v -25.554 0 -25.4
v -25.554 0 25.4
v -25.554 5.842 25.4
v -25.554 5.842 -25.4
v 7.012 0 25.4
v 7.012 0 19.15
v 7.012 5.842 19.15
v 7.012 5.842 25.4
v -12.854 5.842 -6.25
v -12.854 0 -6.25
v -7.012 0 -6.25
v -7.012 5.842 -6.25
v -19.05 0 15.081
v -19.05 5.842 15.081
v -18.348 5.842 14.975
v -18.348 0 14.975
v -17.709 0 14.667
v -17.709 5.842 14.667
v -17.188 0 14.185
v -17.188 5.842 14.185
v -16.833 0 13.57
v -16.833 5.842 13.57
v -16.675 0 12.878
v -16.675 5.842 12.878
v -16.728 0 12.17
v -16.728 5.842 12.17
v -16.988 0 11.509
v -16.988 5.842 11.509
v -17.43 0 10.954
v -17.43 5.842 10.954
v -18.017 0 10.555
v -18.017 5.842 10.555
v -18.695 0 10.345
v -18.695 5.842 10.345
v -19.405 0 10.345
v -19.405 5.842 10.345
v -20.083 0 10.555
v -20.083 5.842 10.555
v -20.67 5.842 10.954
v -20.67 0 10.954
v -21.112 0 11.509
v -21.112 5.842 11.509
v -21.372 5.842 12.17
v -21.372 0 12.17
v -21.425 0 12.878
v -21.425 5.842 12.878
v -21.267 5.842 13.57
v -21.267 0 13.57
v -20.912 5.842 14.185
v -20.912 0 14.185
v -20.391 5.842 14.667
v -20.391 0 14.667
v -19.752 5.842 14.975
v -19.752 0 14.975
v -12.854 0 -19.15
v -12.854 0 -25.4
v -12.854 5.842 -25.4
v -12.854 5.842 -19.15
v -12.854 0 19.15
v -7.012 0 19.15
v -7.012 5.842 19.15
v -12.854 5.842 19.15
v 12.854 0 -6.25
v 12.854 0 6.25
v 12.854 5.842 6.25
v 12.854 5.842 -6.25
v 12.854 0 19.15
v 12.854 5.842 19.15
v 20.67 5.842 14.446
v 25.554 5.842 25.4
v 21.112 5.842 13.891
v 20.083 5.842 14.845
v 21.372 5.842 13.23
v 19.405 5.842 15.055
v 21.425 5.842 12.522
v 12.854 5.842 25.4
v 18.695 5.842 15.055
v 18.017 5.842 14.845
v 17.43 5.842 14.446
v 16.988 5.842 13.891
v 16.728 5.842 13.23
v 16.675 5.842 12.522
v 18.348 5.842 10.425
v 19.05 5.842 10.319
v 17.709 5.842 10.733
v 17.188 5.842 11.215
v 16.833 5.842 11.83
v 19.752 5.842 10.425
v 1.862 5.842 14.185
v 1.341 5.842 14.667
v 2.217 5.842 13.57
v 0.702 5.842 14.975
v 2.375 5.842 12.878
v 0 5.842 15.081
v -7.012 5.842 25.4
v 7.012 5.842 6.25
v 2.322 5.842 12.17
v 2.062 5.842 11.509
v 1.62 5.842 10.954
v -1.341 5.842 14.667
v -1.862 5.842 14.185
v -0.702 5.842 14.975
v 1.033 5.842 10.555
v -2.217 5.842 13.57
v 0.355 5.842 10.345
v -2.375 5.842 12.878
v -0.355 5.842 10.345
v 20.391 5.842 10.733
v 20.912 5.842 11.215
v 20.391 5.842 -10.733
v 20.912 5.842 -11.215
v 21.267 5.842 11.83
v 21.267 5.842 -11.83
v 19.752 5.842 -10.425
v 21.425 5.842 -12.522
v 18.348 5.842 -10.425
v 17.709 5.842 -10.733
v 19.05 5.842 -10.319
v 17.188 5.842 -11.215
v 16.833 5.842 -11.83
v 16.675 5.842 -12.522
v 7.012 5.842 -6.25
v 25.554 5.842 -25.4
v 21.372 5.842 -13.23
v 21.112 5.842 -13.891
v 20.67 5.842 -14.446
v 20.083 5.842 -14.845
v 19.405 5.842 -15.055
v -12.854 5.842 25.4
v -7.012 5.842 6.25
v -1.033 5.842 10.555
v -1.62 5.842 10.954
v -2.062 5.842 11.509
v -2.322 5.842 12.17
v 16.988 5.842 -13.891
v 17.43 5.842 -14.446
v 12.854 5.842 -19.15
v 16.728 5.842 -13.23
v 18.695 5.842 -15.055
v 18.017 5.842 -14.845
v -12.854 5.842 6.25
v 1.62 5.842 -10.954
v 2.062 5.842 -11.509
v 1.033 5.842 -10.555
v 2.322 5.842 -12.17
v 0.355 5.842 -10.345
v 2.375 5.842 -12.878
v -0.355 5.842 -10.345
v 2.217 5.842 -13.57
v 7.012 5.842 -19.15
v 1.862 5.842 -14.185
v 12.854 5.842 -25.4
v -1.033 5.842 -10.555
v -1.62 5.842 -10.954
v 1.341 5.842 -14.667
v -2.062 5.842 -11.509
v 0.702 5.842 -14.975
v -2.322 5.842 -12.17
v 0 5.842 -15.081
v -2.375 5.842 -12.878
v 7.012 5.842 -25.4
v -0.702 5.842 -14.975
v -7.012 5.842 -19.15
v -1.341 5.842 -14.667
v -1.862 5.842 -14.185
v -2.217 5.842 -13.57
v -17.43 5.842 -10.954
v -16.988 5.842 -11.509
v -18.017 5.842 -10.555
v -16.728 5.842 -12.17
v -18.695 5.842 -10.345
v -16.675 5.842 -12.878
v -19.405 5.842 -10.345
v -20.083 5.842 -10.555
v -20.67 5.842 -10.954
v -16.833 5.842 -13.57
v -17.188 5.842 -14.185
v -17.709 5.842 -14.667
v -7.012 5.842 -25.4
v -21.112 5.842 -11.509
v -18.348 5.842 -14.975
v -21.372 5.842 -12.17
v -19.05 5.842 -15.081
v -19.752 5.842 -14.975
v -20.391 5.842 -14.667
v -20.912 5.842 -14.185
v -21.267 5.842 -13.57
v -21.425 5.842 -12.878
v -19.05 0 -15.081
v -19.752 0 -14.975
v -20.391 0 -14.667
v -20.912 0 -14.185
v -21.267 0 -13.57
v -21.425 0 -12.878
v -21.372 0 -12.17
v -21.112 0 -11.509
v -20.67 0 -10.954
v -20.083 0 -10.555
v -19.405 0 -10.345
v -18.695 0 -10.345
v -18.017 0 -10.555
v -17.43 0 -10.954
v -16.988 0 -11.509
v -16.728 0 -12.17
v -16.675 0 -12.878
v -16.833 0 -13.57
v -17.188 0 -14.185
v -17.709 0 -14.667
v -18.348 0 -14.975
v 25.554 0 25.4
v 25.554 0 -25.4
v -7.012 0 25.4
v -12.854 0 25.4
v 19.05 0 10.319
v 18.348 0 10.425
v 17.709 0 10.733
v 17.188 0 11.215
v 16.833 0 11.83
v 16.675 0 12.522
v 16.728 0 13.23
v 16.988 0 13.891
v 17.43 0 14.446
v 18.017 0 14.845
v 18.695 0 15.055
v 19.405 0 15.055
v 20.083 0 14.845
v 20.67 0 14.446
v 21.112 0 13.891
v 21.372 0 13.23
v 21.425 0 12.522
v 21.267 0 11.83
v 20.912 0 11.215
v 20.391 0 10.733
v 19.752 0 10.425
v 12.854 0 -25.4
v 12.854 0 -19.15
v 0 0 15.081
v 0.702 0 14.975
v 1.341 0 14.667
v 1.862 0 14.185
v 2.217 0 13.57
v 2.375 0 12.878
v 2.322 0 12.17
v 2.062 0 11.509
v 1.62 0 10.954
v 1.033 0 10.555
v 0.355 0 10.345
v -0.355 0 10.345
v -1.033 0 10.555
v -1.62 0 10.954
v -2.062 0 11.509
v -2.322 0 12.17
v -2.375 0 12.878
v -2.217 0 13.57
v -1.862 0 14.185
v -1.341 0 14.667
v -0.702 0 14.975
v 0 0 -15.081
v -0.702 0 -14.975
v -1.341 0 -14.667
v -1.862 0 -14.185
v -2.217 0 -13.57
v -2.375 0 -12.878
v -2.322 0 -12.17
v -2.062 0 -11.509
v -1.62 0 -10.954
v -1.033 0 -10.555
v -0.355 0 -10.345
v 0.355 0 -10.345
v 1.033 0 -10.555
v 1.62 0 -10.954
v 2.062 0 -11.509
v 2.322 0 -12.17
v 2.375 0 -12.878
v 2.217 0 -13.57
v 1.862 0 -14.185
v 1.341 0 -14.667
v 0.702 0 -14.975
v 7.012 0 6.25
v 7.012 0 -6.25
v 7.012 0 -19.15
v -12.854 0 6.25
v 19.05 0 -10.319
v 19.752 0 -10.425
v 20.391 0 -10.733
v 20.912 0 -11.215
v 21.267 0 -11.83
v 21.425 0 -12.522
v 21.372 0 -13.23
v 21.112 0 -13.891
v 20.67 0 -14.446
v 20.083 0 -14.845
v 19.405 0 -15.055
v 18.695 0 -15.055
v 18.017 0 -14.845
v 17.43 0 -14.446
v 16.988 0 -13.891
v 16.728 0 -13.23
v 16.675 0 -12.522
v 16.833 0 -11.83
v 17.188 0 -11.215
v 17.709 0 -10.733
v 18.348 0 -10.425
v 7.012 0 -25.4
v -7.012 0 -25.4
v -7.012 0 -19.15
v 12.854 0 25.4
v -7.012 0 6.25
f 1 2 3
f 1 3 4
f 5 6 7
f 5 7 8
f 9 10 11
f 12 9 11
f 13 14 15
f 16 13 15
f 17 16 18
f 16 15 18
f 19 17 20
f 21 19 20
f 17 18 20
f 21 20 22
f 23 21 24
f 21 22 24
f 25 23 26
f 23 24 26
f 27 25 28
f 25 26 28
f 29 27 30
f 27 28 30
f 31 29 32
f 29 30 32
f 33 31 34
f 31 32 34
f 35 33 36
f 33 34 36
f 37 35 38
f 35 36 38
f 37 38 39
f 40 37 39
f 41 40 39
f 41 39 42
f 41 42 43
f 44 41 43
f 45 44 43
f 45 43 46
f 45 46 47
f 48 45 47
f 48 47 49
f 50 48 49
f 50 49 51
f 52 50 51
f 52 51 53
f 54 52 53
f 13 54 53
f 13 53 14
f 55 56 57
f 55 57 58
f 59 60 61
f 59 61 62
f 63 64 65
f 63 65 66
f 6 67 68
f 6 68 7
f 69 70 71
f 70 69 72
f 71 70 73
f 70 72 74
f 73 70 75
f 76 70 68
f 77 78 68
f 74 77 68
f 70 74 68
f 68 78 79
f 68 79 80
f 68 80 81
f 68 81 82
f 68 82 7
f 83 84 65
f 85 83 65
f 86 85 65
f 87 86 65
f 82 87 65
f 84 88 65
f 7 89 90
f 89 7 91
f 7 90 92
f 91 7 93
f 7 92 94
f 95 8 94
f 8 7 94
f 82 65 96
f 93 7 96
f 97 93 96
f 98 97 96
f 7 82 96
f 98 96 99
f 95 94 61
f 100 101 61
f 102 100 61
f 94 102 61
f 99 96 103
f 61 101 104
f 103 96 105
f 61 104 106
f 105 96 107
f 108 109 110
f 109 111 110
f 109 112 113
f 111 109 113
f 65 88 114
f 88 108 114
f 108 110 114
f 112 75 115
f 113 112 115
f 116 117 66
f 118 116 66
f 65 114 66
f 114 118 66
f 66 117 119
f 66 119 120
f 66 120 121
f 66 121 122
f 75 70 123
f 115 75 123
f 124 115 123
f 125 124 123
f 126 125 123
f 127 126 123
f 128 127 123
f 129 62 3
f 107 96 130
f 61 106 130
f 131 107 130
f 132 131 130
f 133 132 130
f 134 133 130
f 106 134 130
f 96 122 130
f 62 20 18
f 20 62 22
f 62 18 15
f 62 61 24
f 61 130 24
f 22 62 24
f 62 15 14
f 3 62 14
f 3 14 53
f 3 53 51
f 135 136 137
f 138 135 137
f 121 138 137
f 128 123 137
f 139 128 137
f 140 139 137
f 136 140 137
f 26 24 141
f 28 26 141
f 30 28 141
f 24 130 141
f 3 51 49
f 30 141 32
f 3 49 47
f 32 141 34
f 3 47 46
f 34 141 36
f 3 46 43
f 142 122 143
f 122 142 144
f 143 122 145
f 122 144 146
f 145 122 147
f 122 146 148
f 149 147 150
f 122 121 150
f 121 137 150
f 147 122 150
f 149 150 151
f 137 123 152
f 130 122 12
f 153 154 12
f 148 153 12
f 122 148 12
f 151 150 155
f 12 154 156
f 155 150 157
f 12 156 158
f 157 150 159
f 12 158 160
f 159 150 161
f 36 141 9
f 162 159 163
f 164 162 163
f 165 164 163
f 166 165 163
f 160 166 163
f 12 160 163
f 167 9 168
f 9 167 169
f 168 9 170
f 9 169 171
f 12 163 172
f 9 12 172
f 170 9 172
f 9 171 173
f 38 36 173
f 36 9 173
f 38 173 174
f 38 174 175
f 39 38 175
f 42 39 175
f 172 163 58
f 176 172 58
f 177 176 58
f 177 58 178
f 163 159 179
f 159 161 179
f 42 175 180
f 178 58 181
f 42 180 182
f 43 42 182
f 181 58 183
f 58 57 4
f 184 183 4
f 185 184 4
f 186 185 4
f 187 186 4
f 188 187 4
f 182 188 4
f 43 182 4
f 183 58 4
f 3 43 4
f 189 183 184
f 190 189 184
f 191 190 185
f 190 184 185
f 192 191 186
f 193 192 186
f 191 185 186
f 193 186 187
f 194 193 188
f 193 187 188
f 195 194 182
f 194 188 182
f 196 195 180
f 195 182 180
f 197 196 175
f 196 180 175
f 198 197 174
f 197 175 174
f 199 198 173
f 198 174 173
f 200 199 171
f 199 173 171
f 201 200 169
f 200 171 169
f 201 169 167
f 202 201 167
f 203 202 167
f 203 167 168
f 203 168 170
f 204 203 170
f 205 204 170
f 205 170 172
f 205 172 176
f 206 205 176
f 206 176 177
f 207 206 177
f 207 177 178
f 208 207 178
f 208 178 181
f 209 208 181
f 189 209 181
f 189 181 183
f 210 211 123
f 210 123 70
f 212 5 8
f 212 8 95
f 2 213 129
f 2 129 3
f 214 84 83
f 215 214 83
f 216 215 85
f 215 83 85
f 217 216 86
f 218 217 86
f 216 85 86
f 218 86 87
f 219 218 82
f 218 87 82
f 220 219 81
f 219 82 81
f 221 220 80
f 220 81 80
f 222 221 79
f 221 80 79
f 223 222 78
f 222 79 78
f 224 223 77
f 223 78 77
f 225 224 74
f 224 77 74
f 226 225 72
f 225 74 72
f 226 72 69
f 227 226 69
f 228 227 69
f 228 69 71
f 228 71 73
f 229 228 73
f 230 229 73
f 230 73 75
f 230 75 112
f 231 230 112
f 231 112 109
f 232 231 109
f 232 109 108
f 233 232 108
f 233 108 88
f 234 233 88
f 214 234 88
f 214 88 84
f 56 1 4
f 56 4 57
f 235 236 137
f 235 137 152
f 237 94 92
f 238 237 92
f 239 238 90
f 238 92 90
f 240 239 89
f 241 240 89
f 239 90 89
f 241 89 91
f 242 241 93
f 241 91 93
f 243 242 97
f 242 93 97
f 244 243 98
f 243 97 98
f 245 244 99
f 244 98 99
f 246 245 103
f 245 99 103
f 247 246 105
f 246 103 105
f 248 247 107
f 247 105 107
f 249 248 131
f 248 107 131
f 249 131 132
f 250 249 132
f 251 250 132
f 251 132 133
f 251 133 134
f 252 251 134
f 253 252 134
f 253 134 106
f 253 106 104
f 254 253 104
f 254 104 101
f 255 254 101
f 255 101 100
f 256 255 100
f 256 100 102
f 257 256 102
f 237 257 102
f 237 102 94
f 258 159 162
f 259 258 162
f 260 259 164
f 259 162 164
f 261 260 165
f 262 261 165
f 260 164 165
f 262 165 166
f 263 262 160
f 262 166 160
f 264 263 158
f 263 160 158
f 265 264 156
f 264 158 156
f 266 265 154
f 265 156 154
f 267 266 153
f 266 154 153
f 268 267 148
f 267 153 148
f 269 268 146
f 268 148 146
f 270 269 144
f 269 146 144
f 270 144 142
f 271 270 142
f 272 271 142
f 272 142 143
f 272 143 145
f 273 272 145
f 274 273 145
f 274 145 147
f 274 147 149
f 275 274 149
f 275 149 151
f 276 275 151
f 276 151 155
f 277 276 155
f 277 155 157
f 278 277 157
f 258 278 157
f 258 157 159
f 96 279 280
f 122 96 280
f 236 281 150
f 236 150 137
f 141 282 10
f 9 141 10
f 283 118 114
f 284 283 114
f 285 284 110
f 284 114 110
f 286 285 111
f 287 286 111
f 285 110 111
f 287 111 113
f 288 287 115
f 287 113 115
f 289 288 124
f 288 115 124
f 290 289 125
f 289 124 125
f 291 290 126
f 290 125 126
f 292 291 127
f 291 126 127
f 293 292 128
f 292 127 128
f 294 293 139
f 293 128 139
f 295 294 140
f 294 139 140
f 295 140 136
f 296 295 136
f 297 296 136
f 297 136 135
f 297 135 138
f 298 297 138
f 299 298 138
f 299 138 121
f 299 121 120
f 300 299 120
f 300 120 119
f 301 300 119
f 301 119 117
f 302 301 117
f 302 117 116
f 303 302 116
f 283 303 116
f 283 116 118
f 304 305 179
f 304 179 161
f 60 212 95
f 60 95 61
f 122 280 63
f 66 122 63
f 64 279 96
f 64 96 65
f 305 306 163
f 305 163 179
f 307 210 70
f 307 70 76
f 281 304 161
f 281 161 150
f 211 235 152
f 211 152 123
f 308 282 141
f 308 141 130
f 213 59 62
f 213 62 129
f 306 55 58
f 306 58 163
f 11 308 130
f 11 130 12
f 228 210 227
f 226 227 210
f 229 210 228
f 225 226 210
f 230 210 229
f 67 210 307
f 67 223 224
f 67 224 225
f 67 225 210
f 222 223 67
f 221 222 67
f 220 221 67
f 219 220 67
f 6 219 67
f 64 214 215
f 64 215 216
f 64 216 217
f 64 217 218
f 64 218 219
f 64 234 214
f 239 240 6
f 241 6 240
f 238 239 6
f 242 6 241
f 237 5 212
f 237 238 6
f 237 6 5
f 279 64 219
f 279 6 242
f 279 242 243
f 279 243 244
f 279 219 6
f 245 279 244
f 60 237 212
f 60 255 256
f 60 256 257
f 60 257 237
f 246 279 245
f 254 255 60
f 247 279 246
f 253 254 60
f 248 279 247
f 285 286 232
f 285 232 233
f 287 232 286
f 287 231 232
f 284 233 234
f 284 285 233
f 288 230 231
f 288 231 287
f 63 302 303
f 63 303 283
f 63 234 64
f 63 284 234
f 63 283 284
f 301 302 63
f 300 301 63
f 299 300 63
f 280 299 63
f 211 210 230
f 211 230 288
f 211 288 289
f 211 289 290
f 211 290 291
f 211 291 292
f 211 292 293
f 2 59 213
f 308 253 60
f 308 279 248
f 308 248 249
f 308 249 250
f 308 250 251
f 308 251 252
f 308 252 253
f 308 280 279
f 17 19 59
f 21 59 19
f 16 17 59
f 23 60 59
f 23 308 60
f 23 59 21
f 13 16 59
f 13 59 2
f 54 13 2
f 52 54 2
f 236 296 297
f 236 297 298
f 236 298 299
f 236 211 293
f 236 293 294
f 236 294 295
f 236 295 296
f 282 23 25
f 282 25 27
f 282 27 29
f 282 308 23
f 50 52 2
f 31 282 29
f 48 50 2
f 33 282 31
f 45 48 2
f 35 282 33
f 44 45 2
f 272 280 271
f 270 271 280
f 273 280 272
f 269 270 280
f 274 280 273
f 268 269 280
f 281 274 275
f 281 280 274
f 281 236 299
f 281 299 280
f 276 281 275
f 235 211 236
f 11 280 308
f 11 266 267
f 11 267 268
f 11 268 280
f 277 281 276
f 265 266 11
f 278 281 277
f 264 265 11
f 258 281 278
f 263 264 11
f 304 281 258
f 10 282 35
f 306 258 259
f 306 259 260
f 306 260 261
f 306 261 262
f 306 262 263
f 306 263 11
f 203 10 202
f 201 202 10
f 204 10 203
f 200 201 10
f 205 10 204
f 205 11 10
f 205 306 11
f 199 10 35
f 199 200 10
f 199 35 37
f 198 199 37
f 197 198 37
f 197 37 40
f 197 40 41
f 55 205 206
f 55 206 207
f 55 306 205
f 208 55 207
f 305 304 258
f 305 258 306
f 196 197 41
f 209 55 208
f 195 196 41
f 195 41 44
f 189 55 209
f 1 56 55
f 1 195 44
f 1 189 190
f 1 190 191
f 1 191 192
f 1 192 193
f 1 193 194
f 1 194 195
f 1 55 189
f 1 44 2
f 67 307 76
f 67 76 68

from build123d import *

# Parameters (mm, degrees)
SKETCH1_W           = 5.842
SKETCH1_H           = 12.5
BOSS_EXTRUDE1_DEPTH = 5.842
SKETCH2_R           = 2.38125
CUT_EXTRUDE1_DEPTH  = 37.500628488


with BuildPart() as part:
    # Sketch1 → Boss-Extrude1 (new body)
    with BuildSketch(Plane(origin=(0, 0, 0), x_dir=(1, 0, 0), z_dir=(0, 1, 0))):
        Polygon((7.012, -25.4), (-7.012, -25.4), (-7.012, -19.15), (-12.854, -19.15), (-12.854, -25.4), (-25.554, -25.4), (-25.554, 25.4), (-12.854, 25.4), (-12.854, 19.15), (-7.012, 19.15), (-7.012, 25.4), (7.012, 25.4), (7.012, 19.15), (12.854, 19.15), (12.854, 25.4), (25.554, 25.4), (25.554, -25.4), (12.854, -25.4), (12.854, -19.15), (7.012, -19.15), align=None)
        with Locations((-9.933, 0)):
            Rectangle(SKETCH1_W, SKETCH1_H, mode=Mode.SUBTRACT)
        with Locations((9.933, 0)):
            Rectangle(SKETCH1_W, SKETCH1_H, mode=Mode.SUBTRACT)
    extrude(amount=BOSS_EXTRUDE1_DEPTH)

    # Sketch2 → Cut-Extrude1 (cut, through all)
    with BuildSketch(Plane(origin=(0, 5.842, 0), x_dir=(1, 0, 0), z_dir=(0, 1, 0))):
        with Locations(Location((0, -12.7, 0), (0, 0, 270))):
            Circle(SKETCH2_R)
        with Locations(Location((0, 12.7, 0), (0, 0, 90))):
            Circle(SKETCH2_R)
        with Locations(Location((19.05, 12.7, 0), (0, 0, 270))):
            Circle(SKETCH2_R)
        with Locations(Location((19.05, -12.7, 0), (0, 0, 90))):
            Circle(SKETCH2_R)
        with Locations(Location((-19.05, 12.7, 0), (0, 0, 90))):
            Circle(SKETCH2_R)
        with Locations(Location((-19.05, -12.7, 0), (0, 0, 270))):
            Circle(SKETCH2_R)
    extrude(amount=-CUT_EXTRUDE1_DEPTH, mode=Mode.SUBTRACT)


solid = part.part
